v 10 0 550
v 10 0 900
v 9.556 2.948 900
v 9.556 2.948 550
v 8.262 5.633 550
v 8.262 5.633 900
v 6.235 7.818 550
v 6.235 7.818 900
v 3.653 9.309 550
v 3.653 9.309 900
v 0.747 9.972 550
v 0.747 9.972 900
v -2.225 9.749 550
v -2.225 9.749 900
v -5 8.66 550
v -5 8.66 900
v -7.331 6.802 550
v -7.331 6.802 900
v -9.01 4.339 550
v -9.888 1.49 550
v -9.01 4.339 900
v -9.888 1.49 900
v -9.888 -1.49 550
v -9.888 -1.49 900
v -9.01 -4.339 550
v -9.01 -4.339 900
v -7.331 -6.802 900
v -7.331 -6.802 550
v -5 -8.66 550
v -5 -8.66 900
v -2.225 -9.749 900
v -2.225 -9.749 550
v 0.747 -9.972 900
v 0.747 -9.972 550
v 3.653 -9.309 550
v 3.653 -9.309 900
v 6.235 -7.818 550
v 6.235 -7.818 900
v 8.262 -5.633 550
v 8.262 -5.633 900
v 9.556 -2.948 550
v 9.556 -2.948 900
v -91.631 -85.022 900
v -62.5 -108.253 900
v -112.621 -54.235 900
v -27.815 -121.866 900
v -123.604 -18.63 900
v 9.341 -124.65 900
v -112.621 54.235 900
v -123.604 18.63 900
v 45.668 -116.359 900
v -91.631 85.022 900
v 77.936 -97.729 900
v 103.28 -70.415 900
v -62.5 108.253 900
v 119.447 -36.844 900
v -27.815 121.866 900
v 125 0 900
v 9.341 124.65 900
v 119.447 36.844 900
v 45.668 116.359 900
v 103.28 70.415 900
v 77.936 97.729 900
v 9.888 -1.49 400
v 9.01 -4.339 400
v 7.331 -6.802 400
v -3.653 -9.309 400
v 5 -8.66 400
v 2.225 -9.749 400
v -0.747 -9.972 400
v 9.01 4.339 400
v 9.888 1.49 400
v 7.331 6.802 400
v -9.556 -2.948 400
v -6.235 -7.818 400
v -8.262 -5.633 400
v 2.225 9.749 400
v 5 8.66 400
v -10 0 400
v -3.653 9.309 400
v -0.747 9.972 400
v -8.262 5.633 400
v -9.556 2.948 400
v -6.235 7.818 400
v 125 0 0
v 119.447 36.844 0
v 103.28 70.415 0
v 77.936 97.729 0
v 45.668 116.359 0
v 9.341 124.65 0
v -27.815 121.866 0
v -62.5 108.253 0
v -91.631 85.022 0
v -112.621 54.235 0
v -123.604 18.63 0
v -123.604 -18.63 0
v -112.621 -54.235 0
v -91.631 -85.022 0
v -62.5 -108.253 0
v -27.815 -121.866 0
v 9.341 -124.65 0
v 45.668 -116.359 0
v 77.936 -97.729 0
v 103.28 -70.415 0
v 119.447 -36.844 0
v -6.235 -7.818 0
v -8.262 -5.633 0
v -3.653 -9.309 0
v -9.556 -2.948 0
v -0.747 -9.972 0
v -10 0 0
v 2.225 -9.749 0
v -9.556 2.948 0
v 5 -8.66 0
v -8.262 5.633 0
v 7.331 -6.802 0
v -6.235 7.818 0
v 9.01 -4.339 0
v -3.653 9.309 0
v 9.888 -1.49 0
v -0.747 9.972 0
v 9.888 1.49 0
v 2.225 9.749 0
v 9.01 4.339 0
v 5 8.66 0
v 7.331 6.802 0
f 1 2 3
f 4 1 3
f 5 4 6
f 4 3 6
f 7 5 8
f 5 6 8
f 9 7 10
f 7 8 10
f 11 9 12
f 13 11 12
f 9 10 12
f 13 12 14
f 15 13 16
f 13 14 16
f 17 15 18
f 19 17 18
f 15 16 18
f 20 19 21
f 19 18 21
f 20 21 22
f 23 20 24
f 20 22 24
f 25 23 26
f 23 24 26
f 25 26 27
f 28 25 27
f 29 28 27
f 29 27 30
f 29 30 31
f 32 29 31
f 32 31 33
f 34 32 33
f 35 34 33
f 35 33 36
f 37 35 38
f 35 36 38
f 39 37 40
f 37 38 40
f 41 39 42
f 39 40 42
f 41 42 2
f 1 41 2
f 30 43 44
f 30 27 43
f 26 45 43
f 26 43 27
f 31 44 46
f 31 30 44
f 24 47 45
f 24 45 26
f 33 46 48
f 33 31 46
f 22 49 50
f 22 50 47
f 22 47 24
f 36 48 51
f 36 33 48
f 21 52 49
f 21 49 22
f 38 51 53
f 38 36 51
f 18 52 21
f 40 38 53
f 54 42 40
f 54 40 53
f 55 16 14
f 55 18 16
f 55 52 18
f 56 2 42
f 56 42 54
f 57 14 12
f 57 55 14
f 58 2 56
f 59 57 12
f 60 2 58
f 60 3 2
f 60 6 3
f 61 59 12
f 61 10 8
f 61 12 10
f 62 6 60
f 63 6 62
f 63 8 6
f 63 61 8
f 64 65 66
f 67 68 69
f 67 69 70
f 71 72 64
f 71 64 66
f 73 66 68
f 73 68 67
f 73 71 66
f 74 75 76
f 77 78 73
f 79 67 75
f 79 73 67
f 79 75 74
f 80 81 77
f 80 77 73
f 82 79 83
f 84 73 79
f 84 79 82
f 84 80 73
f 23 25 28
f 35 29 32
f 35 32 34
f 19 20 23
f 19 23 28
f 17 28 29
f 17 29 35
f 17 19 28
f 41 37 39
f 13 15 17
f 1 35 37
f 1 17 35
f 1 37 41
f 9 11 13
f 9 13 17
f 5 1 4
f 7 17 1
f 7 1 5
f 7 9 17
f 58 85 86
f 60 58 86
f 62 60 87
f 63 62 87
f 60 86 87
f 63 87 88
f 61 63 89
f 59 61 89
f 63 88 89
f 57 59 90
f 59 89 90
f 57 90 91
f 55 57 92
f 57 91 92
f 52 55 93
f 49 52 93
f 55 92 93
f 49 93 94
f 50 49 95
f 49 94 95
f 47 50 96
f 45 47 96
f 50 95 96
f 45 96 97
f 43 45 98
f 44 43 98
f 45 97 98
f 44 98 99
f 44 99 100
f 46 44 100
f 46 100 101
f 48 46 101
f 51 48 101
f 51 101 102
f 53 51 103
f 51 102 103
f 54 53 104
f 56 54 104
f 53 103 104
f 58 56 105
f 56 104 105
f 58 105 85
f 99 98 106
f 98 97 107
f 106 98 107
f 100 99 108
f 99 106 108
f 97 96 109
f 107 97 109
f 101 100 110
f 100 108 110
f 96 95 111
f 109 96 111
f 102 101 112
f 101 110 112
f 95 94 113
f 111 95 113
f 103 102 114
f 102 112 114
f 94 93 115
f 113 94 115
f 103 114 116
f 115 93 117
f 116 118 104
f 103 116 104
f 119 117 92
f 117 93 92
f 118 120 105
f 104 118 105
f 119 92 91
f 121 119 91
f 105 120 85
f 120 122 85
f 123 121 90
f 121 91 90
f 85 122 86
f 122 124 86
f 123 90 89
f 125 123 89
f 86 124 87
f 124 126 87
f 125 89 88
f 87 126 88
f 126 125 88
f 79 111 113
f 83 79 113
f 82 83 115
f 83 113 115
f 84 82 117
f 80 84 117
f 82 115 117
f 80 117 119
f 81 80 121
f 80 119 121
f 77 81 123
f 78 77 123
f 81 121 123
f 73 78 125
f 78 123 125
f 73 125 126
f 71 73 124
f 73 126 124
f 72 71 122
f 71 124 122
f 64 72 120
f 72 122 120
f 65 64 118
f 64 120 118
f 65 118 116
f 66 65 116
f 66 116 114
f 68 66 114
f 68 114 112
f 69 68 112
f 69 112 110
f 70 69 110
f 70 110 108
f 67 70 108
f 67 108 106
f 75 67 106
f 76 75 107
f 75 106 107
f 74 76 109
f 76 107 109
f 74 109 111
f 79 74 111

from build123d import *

# Parameters (mm, degrees)
SKETCH1_R           = 125
BOSS_EXTRUDE1_DEPTH = 900
SKETCH2_R           = 10
CUT_EXTRUDE1_DEPTH  = 350
SKETCH3_R           = 10
CUT_EXTRUDE2_DEPTH  = 400


with BuildPart() as part:
    # Sketch1 → Boss-Extrude1 (new body)
    with BuildSketch(Plane.XY):
        Circle(SKETCH1_R)
    extrude(amount=BOSS_EXTRUDE1_DEPTH)

    # Sketch2 → Cut-Extrude1 (cut)
    with BuildSketch(Plane.XY.offset(900)):
        Circle(SKETCH2_R)
    extrude(amount=-CUT_EXTRUDE1_DEPTH, mode=Mode.SUBTRACT)

    # Sketch3 → Cut-Extrude2 (cut)
    with BuildSketch(Plane(origin=(0, 0, 0), x_dir=(-1, 0, 0), z_dir=(0, 0, -1))):
        Circle(SKETCH3_R)
    extrude(amount=-CUT_EXTRUDE2_DEPTH, mode=Mode.SUBTRACT)


solid = part.part
